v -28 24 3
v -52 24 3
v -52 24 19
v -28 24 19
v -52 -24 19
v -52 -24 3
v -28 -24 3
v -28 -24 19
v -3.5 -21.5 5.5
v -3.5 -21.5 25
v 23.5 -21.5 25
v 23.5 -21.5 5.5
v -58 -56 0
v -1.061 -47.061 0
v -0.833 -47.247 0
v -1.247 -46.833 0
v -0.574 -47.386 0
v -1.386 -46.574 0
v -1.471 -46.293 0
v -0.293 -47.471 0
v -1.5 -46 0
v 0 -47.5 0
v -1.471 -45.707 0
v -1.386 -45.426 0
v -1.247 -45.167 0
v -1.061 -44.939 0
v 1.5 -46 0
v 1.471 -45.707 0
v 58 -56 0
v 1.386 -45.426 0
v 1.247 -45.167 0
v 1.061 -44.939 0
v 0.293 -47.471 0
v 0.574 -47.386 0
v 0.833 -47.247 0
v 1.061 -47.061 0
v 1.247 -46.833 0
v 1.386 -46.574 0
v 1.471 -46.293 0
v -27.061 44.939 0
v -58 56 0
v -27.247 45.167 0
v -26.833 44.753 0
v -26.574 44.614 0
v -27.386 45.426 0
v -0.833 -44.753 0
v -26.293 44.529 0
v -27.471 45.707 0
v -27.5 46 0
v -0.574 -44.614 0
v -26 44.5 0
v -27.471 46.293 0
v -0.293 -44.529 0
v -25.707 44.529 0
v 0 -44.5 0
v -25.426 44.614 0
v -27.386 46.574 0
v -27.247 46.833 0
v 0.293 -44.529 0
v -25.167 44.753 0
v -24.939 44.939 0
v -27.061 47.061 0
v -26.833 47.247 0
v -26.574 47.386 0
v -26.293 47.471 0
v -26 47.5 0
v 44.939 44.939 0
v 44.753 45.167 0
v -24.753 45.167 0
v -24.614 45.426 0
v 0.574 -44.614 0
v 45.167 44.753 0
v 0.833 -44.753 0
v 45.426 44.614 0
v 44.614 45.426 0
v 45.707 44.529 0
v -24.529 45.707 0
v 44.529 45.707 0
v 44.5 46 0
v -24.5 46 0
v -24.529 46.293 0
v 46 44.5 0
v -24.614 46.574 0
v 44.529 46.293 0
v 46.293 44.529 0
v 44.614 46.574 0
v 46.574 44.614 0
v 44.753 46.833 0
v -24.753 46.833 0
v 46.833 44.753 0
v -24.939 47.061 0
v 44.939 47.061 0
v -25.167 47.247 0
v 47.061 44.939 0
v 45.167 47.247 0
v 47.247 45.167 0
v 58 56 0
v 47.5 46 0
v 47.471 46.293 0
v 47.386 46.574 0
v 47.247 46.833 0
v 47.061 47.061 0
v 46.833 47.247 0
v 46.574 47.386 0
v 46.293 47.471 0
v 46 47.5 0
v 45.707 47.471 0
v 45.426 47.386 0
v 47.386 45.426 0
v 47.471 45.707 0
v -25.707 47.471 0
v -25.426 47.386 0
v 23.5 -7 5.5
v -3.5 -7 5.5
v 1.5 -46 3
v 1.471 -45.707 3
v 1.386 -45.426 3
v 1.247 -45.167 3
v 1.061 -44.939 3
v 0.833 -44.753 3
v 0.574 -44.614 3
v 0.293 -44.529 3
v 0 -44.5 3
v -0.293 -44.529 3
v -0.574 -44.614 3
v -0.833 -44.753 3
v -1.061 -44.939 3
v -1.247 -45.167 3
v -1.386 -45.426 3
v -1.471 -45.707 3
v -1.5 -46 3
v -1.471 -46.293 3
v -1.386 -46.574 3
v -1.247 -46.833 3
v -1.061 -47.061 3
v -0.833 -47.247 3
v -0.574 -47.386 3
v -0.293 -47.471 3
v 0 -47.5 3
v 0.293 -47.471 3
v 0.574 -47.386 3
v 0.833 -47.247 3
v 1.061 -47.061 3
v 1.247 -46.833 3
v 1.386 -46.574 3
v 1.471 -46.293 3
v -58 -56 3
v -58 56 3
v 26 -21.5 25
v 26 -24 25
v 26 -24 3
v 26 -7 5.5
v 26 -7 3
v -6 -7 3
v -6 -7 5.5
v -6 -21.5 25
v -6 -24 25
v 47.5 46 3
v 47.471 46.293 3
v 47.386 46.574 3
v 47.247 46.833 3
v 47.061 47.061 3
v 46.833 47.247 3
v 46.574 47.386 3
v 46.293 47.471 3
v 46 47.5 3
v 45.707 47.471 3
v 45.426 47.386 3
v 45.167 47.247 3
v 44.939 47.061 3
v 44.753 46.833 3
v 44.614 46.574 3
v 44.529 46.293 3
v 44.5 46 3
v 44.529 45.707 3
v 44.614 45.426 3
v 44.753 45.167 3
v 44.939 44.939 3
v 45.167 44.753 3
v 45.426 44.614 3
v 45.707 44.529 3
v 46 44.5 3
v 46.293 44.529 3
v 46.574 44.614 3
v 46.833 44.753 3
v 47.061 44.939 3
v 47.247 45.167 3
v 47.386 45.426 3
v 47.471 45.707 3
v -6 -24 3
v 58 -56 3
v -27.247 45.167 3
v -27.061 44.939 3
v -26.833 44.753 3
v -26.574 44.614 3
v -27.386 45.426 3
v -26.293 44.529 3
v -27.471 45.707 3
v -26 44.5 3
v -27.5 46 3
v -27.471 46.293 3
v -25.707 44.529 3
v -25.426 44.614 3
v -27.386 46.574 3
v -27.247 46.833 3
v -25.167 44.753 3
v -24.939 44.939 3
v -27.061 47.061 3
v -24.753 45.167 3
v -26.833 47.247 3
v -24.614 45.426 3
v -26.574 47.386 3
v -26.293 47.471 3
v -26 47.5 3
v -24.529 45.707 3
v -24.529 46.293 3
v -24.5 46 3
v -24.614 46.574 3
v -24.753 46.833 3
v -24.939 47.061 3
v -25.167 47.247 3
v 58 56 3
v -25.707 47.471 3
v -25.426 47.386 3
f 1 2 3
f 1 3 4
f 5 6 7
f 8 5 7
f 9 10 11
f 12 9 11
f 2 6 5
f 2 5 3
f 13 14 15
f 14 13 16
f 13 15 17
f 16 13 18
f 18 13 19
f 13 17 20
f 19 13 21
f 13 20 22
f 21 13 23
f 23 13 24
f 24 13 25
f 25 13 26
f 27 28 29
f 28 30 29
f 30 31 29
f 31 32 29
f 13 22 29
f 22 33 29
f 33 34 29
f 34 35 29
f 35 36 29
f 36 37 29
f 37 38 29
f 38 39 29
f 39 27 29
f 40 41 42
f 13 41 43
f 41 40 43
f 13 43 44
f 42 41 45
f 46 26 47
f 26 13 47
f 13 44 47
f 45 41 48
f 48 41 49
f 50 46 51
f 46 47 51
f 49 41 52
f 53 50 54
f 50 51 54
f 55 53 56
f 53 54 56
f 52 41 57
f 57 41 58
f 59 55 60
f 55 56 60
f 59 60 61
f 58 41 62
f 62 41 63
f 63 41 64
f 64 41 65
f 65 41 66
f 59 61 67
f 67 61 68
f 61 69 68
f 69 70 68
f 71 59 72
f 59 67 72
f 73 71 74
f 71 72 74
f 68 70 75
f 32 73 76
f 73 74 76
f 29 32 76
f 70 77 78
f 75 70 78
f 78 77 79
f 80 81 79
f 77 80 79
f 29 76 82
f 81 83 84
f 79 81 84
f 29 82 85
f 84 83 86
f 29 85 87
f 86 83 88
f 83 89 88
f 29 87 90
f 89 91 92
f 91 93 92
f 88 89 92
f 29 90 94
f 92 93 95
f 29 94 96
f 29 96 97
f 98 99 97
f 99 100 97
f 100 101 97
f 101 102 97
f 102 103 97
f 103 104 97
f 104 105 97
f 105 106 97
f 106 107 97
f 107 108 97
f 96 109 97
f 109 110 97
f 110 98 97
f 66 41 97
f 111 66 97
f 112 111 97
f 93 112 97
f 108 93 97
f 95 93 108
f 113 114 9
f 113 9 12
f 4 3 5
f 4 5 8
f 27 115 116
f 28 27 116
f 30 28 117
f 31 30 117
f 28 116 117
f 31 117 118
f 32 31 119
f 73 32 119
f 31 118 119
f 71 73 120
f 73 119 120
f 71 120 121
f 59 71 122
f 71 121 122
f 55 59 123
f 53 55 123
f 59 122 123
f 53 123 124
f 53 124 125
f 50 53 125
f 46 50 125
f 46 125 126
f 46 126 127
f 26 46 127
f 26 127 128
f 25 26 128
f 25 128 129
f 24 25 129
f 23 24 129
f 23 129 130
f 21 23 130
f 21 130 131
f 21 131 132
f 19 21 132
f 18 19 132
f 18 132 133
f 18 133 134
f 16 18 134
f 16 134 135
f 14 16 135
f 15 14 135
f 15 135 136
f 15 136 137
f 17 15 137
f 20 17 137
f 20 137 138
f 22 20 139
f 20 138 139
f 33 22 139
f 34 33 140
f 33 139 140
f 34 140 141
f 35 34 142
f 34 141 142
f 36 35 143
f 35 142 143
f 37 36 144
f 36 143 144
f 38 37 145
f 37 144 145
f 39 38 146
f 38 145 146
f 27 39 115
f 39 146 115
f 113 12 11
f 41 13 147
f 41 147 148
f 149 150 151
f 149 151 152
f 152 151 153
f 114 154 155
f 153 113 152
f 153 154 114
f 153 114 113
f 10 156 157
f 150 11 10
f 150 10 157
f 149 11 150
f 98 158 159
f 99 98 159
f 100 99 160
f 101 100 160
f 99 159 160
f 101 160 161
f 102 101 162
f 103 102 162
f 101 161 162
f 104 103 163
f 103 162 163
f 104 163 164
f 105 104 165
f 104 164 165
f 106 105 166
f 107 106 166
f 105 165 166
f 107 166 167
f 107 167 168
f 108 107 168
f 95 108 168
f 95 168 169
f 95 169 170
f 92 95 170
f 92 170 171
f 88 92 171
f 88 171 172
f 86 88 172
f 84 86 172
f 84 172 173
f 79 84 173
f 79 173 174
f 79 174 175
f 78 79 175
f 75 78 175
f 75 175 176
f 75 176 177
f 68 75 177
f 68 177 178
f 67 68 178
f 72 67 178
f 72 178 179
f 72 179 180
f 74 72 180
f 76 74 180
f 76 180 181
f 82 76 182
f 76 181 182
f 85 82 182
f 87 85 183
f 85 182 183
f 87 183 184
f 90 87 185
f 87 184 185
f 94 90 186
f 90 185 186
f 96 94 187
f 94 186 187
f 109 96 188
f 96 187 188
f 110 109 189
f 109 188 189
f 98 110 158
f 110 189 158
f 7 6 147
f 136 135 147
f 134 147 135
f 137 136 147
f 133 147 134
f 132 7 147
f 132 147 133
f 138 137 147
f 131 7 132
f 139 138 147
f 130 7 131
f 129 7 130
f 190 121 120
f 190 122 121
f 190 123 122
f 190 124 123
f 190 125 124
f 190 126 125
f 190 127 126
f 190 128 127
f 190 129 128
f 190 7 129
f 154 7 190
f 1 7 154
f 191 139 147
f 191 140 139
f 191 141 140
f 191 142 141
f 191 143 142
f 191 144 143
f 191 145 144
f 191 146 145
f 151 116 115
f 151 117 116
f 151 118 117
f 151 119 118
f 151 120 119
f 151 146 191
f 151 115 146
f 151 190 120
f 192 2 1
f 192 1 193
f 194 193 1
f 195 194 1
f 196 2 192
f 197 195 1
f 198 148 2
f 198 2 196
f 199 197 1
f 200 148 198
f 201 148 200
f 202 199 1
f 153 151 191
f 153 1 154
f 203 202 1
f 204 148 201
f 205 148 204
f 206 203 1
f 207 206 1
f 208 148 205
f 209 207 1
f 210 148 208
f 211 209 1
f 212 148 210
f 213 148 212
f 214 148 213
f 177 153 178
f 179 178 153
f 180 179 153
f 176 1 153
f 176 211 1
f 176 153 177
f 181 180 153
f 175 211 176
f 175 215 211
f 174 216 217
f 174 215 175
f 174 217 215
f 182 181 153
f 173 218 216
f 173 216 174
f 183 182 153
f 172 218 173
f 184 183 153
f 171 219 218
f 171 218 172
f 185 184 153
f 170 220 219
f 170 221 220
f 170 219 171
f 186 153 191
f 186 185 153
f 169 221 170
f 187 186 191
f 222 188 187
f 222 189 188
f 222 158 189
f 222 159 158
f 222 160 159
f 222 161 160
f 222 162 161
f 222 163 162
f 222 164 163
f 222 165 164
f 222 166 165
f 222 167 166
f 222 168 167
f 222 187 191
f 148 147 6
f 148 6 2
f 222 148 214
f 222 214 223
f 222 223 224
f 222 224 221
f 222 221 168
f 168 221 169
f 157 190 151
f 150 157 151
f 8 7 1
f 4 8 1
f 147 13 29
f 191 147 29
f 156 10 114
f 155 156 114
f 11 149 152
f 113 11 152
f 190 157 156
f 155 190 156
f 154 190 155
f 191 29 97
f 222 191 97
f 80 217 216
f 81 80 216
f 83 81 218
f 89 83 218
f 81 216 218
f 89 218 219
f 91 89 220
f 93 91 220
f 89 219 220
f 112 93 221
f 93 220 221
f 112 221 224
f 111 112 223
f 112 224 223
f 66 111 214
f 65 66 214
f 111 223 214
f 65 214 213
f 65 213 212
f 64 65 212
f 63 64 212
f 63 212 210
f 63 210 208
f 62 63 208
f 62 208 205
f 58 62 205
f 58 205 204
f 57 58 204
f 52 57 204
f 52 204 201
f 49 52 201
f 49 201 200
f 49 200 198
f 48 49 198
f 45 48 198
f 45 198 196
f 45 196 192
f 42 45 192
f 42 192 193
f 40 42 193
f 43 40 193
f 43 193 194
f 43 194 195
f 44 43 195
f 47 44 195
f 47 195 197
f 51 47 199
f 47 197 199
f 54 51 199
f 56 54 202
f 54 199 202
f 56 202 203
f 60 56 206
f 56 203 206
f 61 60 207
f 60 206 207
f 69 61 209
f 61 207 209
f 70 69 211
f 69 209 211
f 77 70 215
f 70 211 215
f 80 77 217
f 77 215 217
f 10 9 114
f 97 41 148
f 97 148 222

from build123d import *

# Parameters (mm, degrees)
SKETCH1_W           = 116
SKETCH1_H           = 112
BOSS_EXTRUDE1_DEPTH = 3
SKETCH2_W           = 24
SKETCH2_H           = 48
BOSS_EXTRUDE2_DEPTH = 16
SKETCH3_W           = 32
SKETCH3_H           = 17
BOSS_EXTRUDE3_DEPTH = 22
CUT_EXTRUDE1_REACH  = 86
SKETCH5_W           = 27
SKETCH5_H           = 14.5
CUT_EXTRUDE2_DEPTH  = 19.5
CUT_EXTRUDE3_REACH  = 5
SKETCH6_R           = 1.5


with BuildPart() as part:
    # Sketch1 → Boss-Extrude1 (new body)
    with BuildSketch(Plane.XY):
        Rectangle(SKETCH1_W, SKETCH1_H)
    extrude(amount=BOSS_EXTRUDE1_DEPTH)

    # Sketch2 → Boss-Extrude2 (add)
    with BuildSketch(Plane.XY.offset(3)):
        with Locations((-40, 0)):
            Rectangle(SKETCH2_W, SKETCH2_H)
    extrude(amount=BOSS_EXTRUDE2_DEPTH)

    # Sketch3 → Boss-Extrude3 (add)
    with BuildSketch(Plane.XY.offset(3)):
        with Locations((10, -15.5)):
            Rectangle(SKETCH3_W, SKETCH3_H)
    extrude(amount=BOSS_EXTRUDE3_DEPTH)

    # Sketch4 → Cut-Extrude1 (cut, up to next)
    with BuildSketch(Plane(origin=(26, 0, 0), x_dir=(0, 0, -1), z_dir=(1, 0, 0)), mode=Mode.PRIVATE) as cut_extrude1_sk1:
        Polygon((-25, -21.5), (-5.5, -7), (-25, -7), align=None)
    cut_extrude1_tool1 = extrude(cut_extrude1_sk1.sketch, amount=-CUT_EXTRUDE1_REACH, mode=Mode.PRIVATE) & part.part
    add(cut_extrude1_tool1.solids().sort_by_distance((26, -11.833333, 18.5))[0], mode=Mode.SUBTRACT)

    # Sketch5 → Cut-Extrude2 (cut)
    with BuildSketch(Plane.XY.offset(25)):
        with Locations((10, -14.25)):
            Rectangle(SKETCH5_W, SKETCH5_H)
    extrude(amount=-CUT_EXTRUDE2_DEPTH, mode=Mode.SUBTRACT)

    # Sketch6 → Cut-Extrude3 (cut, up to next)
    with BuildSketch(Plane.XY.offset(3), mode=Mode.PRIVATE) as cut_extrude3_sk1:
        with Locations((-26, 46)):
            Circle(SKETCH6_R)
    cut_extrude3_tool1 = extrude(cut_extrude3_sk1.sketch, amount=-CUT_EXTRUDE3_REACH, mode=Mode.PRIVATE) & part.part
    add(cut_extrude3_tool1.solids().sort_by_distance((-26, 46, 3))[0], mode=Mode.SUBTRACT)
    # Sketch6 → Cut-Extrude3 (cut, up to next)
    with BuildSketch(Plane.XY.offset(3), mode=Mode.PRIVATE) as cut_extrude3_sk2:
        with Locations((46, 46)):
            Circle(SKETCH6_R)
    cut_extrude3_tool2 = extrude(cut_extrude3_sk2.sketch, amount=-CUT_EXTRUDE3_REACH, mode=Mode.PRIVATE) & part.part
    add(cut_extrude3_tool2.solids().sort_by_distance((46, 46, 3))[0], mode=Mode.SUBTRACT)
    # Sketch6 → Cut-Extrude3 (cut, up to next)
    with BuildSketch(Plane.XY.offset(3), mode=Mode.PRIVATE) as cut_extrude3_sk3:
        with Locations((0, -46)):
            Circle(SKETCH6_R)
    cut_extrude3_tool3 = extrude(cut_extrude3_sk3.sketch, amount=-CUT_EXTRUDE3_REACH, mode=Mode.PRIVATE) & part.part
    add(cut_extrude3_tool3.solids().sort_by_distance((0, -46, 3))[0], mode=Mode.SUBTRACT)


solid = part.part
